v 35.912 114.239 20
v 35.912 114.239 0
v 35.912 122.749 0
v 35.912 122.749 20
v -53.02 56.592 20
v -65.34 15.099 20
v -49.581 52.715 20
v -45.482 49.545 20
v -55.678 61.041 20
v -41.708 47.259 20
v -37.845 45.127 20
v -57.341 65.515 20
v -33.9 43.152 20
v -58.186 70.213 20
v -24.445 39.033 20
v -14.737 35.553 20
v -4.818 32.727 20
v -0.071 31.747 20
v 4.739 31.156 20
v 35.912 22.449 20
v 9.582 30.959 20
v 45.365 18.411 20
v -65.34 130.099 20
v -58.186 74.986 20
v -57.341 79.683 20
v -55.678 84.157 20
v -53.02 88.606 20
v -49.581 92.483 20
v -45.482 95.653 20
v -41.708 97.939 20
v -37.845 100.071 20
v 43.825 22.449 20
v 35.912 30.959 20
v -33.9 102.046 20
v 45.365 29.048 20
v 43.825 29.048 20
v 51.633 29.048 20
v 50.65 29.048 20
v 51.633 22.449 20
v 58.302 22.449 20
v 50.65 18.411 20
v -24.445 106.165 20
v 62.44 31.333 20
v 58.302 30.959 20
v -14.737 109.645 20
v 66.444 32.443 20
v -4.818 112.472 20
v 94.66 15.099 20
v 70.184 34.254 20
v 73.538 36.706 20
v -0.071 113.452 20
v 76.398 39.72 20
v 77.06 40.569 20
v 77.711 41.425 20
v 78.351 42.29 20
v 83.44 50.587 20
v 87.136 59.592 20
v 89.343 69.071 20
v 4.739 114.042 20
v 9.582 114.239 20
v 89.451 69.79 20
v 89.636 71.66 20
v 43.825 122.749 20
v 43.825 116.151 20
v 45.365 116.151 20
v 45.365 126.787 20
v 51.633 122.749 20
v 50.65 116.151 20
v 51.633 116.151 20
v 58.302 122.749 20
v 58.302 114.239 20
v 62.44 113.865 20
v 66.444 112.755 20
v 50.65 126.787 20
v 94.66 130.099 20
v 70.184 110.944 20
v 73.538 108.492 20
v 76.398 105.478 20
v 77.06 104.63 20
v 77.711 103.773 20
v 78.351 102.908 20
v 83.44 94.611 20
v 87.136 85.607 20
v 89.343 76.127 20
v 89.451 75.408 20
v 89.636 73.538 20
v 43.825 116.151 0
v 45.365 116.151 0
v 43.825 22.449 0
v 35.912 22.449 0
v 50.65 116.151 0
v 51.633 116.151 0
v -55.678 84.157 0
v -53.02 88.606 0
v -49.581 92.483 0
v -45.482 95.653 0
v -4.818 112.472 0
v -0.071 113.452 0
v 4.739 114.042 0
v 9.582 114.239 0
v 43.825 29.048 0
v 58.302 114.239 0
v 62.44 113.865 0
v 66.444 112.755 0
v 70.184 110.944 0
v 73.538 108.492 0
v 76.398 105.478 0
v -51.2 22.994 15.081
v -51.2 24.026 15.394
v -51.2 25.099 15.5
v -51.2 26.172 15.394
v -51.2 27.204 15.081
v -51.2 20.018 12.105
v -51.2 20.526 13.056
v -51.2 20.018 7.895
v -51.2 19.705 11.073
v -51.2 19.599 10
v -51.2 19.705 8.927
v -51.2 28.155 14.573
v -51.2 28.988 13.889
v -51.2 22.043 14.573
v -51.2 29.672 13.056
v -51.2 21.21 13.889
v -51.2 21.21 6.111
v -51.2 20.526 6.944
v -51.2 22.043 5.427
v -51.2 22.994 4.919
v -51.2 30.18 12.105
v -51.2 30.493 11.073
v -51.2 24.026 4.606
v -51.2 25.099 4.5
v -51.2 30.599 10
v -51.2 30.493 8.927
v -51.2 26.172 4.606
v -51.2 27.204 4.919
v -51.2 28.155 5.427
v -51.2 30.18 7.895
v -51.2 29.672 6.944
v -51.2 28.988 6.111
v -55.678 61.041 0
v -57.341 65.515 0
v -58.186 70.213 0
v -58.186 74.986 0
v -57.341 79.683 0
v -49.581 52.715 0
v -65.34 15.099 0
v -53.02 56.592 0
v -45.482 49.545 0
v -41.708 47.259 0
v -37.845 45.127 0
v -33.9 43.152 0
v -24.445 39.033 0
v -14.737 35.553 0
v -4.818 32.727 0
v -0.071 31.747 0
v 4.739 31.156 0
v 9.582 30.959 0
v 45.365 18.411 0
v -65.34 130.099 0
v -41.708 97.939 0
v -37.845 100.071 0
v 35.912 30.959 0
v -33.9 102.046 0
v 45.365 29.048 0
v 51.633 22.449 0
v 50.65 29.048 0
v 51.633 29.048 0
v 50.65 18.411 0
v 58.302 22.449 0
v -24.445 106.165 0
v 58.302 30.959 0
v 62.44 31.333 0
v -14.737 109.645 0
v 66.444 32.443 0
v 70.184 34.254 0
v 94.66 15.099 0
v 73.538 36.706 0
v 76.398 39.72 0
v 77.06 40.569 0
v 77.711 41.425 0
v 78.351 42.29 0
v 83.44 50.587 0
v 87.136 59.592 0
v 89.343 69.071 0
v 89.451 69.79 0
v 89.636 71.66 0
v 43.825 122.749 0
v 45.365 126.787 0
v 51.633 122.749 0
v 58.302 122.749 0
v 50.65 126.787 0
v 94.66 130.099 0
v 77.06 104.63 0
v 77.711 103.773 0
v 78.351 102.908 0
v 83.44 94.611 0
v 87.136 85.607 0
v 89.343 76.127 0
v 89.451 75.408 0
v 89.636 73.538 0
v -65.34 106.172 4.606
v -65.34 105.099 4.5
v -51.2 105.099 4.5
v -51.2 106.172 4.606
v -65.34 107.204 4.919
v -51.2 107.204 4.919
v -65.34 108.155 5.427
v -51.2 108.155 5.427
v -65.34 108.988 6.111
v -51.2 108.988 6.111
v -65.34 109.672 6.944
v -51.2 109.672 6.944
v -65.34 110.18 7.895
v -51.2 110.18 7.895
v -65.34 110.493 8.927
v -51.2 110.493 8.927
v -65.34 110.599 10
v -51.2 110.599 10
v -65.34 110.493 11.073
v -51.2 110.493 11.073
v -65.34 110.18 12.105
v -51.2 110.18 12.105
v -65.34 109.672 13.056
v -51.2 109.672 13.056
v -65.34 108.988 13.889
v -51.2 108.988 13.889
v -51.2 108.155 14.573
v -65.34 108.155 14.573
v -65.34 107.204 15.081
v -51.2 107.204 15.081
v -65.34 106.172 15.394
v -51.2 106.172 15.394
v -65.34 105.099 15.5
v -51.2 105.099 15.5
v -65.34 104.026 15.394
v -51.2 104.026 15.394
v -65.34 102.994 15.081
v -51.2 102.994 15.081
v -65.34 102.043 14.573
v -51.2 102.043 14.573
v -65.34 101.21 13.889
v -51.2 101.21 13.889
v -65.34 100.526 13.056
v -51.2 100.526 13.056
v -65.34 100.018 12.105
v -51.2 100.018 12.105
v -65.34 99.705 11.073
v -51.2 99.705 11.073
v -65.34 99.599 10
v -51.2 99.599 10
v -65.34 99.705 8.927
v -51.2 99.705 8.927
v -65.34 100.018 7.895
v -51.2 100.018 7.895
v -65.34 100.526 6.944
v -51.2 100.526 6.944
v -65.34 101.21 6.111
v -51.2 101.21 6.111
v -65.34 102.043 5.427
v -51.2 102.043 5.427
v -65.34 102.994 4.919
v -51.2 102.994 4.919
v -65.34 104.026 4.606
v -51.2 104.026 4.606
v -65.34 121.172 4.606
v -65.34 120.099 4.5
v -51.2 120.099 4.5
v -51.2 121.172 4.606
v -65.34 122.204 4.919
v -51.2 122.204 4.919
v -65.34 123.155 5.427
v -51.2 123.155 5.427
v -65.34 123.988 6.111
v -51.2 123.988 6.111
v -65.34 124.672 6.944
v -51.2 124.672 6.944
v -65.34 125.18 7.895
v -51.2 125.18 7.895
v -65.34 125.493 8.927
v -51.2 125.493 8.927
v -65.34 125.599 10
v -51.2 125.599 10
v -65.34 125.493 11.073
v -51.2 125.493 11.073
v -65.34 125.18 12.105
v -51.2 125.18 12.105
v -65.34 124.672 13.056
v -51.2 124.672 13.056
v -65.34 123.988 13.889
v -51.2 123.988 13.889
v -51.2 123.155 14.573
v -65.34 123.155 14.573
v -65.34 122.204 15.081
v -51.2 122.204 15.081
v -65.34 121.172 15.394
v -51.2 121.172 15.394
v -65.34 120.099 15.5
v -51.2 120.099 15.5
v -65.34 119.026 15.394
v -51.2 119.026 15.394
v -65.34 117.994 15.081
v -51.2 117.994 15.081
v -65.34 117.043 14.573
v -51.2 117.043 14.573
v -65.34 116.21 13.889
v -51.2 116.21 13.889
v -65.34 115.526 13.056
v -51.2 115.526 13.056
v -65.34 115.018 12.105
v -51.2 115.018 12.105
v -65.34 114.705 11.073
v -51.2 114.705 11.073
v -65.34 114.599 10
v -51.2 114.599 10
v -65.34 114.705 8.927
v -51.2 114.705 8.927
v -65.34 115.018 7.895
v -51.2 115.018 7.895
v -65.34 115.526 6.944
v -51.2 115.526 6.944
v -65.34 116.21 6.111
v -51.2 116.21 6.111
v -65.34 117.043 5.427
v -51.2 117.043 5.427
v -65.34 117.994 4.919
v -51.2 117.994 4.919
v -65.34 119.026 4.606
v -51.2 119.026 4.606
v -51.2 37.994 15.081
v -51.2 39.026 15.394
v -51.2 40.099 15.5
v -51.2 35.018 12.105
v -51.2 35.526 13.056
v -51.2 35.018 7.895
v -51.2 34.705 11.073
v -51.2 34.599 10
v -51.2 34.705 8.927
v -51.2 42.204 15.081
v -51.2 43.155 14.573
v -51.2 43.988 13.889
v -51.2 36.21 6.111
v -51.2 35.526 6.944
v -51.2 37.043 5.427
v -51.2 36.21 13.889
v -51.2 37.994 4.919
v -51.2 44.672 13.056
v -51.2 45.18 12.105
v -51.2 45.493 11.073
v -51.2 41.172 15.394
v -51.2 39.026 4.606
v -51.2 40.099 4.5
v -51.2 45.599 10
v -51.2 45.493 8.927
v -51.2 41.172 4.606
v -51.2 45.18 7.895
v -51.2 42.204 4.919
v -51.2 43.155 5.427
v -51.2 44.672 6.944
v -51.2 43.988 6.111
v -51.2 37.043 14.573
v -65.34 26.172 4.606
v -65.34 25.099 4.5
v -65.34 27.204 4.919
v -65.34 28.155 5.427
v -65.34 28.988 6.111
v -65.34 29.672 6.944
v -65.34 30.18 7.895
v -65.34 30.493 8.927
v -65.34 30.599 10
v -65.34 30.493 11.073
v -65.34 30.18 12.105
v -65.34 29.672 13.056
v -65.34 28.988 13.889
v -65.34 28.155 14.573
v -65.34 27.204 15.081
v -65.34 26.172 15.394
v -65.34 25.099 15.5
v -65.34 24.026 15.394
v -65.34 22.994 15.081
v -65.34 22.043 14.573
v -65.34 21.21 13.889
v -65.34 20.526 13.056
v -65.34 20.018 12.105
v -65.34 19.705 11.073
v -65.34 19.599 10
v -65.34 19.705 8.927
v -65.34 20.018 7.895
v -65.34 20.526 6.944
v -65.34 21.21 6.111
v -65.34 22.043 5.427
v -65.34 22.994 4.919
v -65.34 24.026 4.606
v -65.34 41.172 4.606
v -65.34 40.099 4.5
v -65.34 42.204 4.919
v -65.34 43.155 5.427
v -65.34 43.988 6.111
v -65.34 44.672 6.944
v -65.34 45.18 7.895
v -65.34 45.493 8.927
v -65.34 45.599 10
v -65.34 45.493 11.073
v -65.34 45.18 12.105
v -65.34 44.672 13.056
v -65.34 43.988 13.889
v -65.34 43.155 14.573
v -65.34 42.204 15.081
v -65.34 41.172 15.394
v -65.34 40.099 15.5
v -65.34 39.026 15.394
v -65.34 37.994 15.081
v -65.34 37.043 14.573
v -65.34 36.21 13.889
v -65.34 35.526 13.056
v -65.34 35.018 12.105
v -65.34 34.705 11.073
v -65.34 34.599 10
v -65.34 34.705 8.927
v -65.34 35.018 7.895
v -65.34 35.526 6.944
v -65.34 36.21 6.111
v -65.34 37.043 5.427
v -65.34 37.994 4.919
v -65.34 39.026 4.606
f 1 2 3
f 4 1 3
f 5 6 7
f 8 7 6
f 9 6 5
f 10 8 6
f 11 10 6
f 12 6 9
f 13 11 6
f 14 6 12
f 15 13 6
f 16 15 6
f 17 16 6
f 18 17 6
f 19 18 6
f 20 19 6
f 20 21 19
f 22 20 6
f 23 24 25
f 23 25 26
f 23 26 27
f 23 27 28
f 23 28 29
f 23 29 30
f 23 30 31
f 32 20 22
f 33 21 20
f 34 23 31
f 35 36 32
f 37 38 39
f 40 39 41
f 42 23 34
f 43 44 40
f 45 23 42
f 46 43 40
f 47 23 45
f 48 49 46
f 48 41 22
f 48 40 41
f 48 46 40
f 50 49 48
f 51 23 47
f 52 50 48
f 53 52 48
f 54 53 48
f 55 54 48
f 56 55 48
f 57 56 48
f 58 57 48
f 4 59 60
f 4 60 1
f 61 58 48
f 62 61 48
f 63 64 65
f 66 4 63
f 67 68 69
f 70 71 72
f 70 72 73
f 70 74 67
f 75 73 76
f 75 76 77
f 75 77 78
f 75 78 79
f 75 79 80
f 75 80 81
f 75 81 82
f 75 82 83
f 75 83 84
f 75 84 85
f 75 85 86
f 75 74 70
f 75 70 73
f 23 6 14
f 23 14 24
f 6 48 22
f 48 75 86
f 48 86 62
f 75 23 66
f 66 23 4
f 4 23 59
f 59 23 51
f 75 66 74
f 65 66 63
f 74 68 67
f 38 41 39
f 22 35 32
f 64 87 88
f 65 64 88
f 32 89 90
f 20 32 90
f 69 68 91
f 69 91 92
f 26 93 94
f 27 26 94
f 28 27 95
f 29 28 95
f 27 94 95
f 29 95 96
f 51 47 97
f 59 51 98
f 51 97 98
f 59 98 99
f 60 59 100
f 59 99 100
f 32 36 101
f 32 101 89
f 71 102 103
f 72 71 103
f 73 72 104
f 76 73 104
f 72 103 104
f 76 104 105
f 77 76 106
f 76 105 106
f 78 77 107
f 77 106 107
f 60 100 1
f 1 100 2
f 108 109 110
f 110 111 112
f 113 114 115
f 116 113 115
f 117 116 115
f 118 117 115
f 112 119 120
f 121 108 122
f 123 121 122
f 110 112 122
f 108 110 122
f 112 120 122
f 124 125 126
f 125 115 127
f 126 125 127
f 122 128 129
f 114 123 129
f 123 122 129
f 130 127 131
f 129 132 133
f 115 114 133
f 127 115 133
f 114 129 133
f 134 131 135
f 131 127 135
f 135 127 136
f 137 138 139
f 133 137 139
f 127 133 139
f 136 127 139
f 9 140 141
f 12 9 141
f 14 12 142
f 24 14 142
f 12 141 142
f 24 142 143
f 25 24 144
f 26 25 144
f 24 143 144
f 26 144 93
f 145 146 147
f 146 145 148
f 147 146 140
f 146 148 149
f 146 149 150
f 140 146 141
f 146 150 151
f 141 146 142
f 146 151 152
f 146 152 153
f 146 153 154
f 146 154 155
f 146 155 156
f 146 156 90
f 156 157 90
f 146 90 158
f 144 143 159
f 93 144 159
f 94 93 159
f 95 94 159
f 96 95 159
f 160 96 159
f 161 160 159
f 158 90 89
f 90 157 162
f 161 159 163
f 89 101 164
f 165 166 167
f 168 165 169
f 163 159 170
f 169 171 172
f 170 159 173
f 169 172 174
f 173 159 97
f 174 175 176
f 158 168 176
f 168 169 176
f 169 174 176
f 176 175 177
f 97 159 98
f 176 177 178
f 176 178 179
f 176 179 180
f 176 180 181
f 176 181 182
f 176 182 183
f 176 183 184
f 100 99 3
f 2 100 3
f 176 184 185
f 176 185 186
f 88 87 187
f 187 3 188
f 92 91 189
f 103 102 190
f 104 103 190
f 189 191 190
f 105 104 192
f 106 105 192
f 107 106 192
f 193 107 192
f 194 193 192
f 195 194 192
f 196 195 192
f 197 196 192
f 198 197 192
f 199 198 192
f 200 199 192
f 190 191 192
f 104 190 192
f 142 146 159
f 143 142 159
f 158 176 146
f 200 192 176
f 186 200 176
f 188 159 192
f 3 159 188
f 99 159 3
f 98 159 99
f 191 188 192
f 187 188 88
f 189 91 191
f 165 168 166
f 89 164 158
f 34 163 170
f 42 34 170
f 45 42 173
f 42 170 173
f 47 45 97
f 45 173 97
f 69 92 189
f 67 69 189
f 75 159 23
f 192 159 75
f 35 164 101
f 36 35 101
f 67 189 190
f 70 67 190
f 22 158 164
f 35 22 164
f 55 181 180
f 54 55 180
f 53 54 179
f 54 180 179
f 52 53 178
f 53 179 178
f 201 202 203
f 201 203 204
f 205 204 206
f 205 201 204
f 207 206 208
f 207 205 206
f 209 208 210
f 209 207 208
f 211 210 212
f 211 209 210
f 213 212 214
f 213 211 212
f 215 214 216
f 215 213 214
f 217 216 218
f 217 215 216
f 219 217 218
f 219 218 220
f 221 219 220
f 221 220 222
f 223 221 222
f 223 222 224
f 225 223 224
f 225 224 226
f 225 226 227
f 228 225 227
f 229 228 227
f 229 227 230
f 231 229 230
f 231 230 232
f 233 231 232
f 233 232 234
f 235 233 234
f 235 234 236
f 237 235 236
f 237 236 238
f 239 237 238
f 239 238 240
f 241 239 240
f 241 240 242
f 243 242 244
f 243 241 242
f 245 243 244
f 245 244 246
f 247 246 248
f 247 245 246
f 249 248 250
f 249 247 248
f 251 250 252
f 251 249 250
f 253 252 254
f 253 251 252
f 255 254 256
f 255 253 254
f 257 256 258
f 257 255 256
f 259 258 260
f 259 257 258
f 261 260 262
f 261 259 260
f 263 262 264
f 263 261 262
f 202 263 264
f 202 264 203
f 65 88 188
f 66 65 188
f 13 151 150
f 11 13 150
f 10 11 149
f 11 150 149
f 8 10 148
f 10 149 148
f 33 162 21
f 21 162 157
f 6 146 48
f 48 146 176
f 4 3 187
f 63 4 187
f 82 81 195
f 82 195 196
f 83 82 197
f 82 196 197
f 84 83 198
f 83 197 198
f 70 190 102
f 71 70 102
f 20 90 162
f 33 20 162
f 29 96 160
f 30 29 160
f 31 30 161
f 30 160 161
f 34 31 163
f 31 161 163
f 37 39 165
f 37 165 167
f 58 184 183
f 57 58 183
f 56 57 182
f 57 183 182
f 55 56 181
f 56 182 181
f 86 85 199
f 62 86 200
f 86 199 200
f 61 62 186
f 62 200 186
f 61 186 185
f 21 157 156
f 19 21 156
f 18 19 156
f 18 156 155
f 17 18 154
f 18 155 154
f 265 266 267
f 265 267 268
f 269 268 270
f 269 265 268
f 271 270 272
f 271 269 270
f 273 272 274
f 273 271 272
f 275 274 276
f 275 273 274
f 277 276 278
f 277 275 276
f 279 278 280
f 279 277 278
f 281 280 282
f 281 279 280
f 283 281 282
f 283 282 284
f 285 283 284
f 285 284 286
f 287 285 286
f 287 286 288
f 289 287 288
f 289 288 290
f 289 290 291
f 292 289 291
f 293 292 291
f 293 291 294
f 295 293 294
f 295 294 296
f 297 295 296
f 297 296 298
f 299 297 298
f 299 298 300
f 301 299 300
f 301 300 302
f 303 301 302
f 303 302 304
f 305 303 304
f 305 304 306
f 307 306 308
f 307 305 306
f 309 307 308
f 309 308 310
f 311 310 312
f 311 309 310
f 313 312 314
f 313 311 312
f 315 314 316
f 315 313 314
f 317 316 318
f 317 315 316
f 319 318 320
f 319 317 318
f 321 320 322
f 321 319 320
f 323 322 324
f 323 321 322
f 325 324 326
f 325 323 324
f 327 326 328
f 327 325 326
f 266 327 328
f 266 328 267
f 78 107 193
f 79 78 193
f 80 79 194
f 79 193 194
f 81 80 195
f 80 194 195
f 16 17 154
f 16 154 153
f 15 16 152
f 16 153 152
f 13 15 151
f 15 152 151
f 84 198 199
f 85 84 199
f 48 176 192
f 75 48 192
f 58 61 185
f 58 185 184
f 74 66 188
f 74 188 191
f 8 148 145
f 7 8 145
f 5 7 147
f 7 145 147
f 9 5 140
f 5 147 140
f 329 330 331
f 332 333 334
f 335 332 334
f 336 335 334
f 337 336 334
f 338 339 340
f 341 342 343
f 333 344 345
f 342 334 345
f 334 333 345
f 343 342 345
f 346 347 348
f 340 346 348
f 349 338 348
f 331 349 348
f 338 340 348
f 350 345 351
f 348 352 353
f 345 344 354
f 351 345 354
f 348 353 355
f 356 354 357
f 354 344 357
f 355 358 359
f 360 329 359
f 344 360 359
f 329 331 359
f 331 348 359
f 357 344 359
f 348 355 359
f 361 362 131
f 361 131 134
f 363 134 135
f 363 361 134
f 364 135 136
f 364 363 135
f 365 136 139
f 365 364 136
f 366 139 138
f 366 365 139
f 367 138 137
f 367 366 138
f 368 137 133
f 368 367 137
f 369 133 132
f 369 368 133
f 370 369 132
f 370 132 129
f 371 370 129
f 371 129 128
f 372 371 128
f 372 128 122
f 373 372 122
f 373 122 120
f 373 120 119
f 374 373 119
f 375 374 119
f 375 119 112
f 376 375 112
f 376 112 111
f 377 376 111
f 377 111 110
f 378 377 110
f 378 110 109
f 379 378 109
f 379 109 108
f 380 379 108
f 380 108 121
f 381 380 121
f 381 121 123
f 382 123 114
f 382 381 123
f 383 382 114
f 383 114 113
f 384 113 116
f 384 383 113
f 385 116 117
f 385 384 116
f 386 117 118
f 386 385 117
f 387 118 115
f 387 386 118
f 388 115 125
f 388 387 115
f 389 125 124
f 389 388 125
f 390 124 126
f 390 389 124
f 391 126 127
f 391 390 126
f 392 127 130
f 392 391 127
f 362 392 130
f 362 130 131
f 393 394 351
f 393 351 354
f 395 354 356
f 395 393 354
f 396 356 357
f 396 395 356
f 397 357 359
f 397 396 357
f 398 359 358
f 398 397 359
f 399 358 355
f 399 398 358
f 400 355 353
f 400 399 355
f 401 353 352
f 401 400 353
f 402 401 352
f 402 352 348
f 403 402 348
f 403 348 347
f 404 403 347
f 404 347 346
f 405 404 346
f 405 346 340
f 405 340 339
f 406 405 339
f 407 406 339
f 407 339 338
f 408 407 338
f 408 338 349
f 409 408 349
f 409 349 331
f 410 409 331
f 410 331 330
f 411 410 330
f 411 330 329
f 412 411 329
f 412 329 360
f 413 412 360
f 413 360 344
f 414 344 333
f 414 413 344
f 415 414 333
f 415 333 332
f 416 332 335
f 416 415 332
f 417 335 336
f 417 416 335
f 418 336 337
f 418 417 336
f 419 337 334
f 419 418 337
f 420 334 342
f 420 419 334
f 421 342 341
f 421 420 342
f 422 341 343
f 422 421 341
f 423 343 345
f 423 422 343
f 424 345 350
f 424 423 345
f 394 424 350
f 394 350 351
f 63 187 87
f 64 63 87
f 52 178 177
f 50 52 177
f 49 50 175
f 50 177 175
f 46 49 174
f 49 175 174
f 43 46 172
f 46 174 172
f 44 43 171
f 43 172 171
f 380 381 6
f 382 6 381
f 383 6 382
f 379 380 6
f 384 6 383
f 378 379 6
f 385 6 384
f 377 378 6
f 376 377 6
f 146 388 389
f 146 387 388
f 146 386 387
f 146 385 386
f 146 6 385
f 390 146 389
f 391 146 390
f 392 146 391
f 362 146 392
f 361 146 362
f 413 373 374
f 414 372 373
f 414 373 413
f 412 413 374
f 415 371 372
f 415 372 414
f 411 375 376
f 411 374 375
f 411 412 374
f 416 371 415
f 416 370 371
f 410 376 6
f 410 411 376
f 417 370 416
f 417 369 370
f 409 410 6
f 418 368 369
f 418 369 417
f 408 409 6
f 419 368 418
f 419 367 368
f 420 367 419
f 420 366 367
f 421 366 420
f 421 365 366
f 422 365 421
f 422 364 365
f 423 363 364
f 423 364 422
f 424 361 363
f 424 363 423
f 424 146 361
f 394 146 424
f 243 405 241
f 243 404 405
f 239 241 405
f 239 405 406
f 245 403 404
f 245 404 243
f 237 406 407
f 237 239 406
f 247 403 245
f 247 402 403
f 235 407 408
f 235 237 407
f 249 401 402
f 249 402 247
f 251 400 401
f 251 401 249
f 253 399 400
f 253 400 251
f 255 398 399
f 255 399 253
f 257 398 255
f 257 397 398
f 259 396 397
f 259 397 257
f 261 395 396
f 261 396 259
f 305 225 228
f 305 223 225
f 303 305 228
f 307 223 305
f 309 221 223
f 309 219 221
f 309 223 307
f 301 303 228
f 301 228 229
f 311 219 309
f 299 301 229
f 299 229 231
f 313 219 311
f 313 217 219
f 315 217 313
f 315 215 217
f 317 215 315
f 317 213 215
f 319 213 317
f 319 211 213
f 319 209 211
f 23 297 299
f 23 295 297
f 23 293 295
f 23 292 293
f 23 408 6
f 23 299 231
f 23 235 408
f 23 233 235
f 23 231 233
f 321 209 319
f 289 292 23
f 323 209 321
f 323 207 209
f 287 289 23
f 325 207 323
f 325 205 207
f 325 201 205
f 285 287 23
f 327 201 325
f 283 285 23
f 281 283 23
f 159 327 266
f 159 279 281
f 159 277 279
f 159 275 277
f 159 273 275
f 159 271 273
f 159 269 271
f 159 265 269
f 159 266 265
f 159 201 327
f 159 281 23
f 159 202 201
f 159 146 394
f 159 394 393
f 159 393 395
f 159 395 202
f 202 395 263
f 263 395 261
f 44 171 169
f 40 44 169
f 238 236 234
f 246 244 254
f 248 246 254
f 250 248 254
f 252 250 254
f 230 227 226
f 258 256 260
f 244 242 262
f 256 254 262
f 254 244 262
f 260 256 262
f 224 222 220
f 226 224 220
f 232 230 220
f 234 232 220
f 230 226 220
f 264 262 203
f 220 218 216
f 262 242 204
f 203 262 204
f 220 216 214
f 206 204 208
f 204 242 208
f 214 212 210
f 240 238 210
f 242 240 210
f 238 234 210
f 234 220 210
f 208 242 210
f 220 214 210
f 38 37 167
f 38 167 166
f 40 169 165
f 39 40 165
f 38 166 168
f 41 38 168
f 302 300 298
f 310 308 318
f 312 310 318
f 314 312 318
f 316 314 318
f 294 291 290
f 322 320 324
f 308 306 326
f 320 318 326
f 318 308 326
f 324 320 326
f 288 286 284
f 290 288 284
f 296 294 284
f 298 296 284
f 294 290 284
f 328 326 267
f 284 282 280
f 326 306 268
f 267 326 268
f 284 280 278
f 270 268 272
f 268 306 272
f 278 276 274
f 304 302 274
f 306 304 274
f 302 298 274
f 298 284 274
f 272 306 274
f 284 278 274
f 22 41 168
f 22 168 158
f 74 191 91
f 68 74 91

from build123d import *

# Parameters (mm, degrees)
SKETCH_4_W          = 160
SKETCH_4_H          = 115
EXTRUDE_1_DEPTH     = 20
CUT_EXTRUDE_1_DEPTH = 20
SKETCH_16_R         = 5.5
CUT_EXTRUDE_2_DEPTH = 15


with BuildPart() as part:
    # 草圖4 → 填料-伸長1 (new body)
    with BuildSketch(Plane.XY):
        with Locations((14.659712787, 72.59909222)):
            Rectangle(SKETCH_4_W, SKETCH_4_H)
    extrude(amount=EXTRUDE_1_DEPTH)

    # 草圖2 → 除料-伸長1 (cut)
    with BuildSketch(Plane.XY):
        with BuildLine():
            Line((9.582154386, 114.239387395), (32.639572719, 114.239387395))
            Line((32.639572719, 114.239387395), (35.911975242, 114.239387395))
            Line((35.911975242, 114.239387395), (35.911975242, 122.748829131))
            Line((35.911975242, 122.748829131), (43.825042281, 122.748829131))
            Line((43.825042281, 122.748829131), (43.825042281, 116.150572029))
            Line((43.825042281, 116.150572029), (45.365452665, 116.150572029))
            Line((45.365452665, 116.150572029), (45.365452665, 126.787374199))
            Line((45.365452665, 126.787374199), (50.650153823, 126.787374199))
            Line((50.650153823, 126.787374199), (50.650153823, 116.150572029))
            Line((50.650153823, 116.150572029), (51.63260176, 116.150572029))
            Line((51.63260176, 116.150572029), (51.63260176, 122.748829131))
            Line((51.63260176, 122.748829131), (58.302252446, 122.748829131))
            Line((58.302252446, 122.748829131), (58.302252446, 114.239387395))
            ThreePointArc((58.302252446, 114.239387395), (68.354977159, 111.933757574), (76.3981894, 105.477757274))
            ThreePointArc((76.3981894, 105.477757274), (77.386875553, 104.202213525), (78.350890948, 102.907923572))
            ThreePointArc((78.350890948, 102.907923572), (85.469179447, 90.183153699), (89.343429579, 76.126838912))
            Line((89.343429579, 76.126838912), (89.450916797, 75.407862922))
            ThreePointArc((89.450916797, 75.407862922), (89.659712787, 72.59909222), (89.450916797, 69.790321519))
            Line((89.450916797, 69.790321519), (89.343429579, 69.071345528))
            ThreePointArc((89.343429579, 69.071345528), (85.469179447, 55.015030741), (78.350890948, 42.290260868))
            ThreePointArc((78.350890948, 42.290260868), (77.386875553, 40.995970915), (76.3981894, 39.720427166))
            ThreePointArc((76.3981894, 39.720427166), (68.354977159, 33.264426866), (58.302252446, 30.958797045))
            Line((58.302252446, 30.958797045), (58.302252446, 22.449355309))
            Line((58.302252446, 22.449355309), (51.63260176, 22.449355309))
            Line((51.63260176, 22.449355309), (51.63260176, 29.047612411))
            Line((51.63260176, 29.047612411), (50.650153823, 29.047612411))
            Line((50.650153823, 29.047612411), (50.650153823, 18.410810241))
            Line((50.650153823, 18.410810241), (45.365452665, 18.410810241))
            Line((45.365452665, 18.410810241), (45.365452665, 29.047612411))
            Line((45.365452665, 29.047612411), (43.825042281, 29.047612411))
            Line((43.825042281, 29.047612411), (43.825042281, 22.449355309))
            Line((43.825042281, 22.449355309), (35.911975242, 22.449355309))
            Line((35.911975242, 22.449355309), (35.911975242, 30.958797045))
            Line((35.911975242, 30.958797045), (32.639572719, 30.958797045))
            Line((32.639572719, 30.958797045), (9.582154386, 30.958797045))
            ThreePointArc((9.582154386, 30.958797045), (2.328045496, 31.402381927), (-4.817967678, 32.726526576))
            ThreePointArc((-4.817967678, 32.726526576), (-19.619782039, 37.212171907), (-33.900352311, 43.151871824))
            ThreePointArc((-33.900352311, 43.151871824), (-39.787433986, 46.173940455), (-45.481740166, 49.545217155))
            ThreePointArc((-45.481740166, 49.545217155), (-51.391366265, 54.573313812), (-55.677619443, 61.041193705))
            ThreePointArc((-55.677619443, 61.041193705), (-58.292337425, 72.59909222), (-55.677619443, 84.156990735))
            ThreePointArc((-55.677619443, 84.156990735), (-51.391366265, 90.624870628), (-45.481740166, 95.652967285))
            ThreePointArc((-45.481740166, 95.652967285), (-39.787433986, 99.024243985), (-33.900352311, 102.046312617))
            ThreePointArc((-33.900352311, 102.046312617), (-19.619782039, 107.986012534), (-4.817967678, 112.471657865))
            ThreePointArc((-4.817967678, 112.471657865), (2.328045496, 113.795802514), (9.582154386, 114.239387395))
        make_face()
    extrude(amount=CUT_EXTRUDE_1_DEPTH, mode=Mode.SUBTRACT)

    # 草圖16 → 除料-伸長2 (cut)
    with BuildSketch(Plane(origin=(-66.2, 0, 0), x_dir=(0, 0, -1), z_dir=(1, 0, 0))):
        with Locations((-10, 120.09909222)):
            Circle(SKETCH_16_R)
        with Locations((-10, 105.09909222)):
            Circle(SKETCH_16_R)
        with Locations((-10, 40.09909222)):
            Circle(SKETCH_16_R)
        with Locations((-10, 25.09909222)):
            Circle(SKETCH_16_R)
    extrude(amount=CUT_EXTRUDE_2_DEPTH, mode=Mode.SUBTRACT)


solid = part.part
